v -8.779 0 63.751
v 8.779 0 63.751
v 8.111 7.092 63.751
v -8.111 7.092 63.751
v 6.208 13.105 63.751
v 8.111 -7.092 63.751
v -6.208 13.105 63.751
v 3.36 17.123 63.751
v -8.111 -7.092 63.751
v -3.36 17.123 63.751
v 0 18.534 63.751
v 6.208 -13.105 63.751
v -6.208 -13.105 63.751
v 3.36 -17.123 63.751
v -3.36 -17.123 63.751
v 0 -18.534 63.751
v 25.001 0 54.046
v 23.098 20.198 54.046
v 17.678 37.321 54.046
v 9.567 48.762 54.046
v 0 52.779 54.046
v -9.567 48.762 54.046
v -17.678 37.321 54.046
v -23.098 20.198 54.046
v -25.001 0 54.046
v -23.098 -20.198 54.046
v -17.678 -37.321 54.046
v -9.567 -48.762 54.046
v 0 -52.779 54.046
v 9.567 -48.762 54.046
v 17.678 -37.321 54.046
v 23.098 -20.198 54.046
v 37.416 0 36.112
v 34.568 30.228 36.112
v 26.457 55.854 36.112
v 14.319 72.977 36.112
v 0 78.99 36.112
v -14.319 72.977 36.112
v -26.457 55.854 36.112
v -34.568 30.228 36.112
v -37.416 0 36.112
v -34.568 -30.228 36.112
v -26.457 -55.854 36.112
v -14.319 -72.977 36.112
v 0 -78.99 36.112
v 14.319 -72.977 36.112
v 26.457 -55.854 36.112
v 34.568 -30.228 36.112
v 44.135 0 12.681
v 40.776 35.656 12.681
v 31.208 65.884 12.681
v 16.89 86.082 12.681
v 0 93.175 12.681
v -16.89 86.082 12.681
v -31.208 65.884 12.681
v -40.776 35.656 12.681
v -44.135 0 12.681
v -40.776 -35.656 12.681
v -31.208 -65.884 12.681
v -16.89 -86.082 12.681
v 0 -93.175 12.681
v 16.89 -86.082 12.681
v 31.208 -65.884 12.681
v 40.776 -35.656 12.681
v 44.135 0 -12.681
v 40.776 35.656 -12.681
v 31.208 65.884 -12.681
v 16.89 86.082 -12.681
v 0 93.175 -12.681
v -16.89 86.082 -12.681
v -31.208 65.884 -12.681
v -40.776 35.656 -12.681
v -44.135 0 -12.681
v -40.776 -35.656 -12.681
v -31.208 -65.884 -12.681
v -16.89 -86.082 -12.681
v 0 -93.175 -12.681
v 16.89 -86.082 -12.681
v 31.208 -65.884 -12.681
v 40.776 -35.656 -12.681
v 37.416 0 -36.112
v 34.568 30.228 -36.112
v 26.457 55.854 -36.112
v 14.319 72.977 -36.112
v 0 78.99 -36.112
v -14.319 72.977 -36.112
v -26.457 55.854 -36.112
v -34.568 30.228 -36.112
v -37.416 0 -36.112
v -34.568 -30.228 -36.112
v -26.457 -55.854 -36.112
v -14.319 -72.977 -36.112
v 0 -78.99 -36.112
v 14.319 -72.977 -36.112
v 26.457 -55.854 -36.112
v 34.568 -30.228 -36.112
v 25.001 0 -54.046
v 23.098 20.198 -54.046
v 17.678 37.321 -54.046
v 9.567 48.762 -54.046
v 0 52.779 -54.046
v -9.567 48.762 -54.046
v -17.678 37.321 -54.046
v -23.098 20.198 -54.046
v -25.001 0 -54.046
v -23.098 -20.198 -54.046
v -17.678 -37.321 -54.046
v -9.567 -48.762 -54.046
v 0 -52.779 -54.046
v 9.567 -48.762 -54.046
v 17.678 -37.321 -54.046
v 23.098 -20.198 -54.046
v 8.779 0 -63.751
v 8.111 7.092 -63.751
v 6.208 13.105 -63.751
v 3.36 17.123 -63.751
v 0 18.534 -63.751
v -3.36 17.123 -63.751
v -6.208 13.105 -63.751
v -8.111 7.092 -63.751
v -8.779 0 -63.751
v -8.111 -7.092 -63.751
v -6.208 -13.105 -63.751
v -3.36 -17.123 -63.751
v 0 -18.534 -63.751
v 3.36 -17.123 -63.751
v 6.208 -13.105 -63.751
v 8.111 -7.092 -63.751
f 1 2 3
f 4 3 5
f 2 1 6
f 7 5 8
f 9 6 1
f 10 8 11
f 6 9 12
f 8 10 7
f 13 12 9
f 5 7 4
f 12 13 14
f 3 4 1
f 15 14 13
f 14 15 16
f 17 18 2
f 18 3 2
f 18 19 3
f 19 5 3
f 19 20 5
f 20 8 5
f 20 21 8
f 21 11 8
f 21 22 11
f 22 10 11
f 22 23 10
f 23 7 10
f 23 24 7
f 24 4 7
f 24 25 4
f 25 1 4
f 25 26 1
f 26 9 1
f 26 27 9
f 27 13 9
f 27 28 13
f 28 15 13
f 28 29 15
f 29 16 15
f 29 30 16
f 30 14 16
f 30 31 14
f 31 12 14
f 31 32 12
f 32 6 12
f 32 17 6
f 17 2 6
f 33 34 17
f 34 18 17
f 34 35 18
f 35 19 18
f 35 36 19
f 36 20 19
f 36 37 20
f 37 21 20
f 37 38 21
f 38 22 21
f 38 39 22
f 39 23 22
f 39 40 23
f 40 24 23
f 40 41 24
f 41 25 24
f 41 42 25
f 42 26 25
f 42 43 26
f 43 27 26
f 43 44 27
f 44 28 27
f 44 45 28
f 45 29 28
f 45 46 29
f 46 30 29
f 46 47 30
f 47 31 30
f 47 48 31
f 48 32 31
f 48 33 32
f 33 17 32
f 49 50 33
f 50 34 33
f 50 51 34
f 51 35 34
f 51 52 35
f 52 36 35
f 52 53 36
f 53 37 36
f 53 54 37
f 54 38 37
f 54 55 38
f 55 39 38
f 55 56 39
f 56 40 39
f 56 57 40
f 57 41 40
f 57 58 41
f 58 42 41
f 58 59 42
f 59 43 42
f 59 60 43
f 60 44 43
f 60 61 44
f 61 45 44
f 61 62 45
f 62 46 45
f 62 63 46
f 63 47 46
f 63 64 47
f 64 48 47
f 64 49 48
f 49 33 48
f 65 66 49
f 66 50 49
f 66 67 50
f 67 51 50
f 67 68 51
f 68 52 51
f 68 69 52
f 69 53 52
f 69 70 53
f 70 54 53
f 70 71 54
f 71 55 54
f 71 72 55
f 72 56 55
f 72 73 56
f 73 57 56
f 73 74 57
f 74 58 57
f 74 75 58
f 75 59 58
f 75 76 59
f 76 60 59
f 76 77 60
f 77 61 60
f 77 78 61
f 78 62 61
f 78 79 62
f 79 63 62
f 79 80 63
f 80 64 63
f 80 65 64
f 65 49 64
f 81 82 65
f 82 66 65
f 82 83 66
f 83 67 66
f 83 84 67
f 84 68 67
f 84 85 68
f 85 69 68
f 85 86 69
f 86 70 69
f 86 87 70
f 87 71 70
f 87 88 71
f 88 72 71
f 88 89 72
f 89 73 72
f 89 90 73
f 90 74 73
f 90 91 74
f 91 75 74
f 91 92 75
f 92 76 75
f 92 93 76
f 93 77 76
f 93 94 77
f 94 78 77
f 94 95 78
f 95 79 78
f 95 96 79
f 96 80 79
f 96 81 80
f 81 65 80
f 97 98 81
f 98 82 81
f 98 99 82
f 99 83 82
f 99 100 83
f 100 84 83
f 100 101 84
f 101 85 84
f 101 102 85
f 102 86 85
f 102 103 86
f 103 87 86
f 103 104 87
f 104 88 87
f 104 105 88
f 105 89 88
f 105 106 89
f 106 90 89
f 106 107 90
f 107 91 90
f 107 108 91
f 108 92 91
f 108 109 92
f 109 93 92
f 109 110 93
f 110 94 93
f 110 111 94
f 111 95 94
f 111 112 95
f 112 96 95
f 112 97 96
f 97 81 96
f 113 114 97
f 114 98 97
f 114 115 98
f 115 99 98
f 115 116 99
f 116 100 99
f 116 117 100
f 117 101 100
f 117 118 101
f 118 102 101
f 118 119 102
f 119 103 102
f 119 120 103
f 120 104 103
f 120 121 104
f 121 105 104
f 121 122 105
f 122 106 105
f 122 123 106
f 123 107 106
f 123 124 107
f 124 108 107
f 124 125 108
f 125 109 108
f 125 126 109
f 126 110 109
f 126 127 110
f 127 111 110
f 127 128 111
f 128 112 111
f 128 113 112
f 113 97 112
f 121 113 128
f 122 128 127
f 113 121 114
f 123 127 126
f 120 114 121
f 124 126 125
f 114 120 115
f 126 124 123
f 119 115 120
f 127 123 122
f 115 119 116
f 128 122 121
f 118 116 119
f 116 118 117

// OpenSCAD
// Generated by SolidPython 1.0.1 on 2020-07-29 00:46:49


scale(v = [9, 19, 13]) {
	sphere(r = 5);
}
/***********************************************
*********      SolidPython code:      **********
************************************************
 
# import packages: SolidPython
from solid import *
from solid.utils import *
from itertools import chain, combinations, permutations


class Resize:

    def __init__(self, scad_file):
        self.scad_file = scad_file
        #self.scad_file = import_scad(scad_file)
        # cone/cylinder param:
        self.r1 = 0
        self.r2 = 0
        self.h = 0
        # rectangular prism param:
        self.w = 0
        self.l = 0
        # ellipse param:
        self.r = 0

    # import OpenScad code (file name corresponds to shape)


    # classify shape + parameters
    def assign(self, param1, param2, param3):
        if self.scad_file == 'cone.scad':
            self.r1 = param1
            self.r2 = param2
            self.h = param3
        elif self.scad_file == 'cylinder.scad':
            self.r1 = param1
            self.r2 = param2
            self.h = param3
        elif self.scad_file == 'rectangularPrism.scad':
            self.h = param1
            self.l = param2
            self.w = param3
        else:
            self.r = param1
            self.h = param2

    # resize parameters
    def iterate(self):
        x = range(3, 20, 2)
        i = 1
        if self.scad_file == 'cone.scad':
            tempList = list(permutations(x, 2))
            for temp in tempList:
                param1 = temp[0]
                param2 = temp[1]
                filepath = 'produced_scad_files/' + 'cone' + str(param1) + '_' + str(param2) + '_' + '.scad'
                scad_render_to_file(cylinder(h=param1, r1=param2, r2=0), filepath)

        elif self.scad_file == 'cylinder.scad':
            tempList = list(permutations(x, 3))
            for temp in tempList:
                param1 = temp[0]
                param2 = temp[1]
                filepath = 'produced_scad_files/' + 'cylinder' + str(param1) + '_' + str(param2) + '_' + '.scad'
                scad_render_to_file(cylinder(h=param1, r1=param2, r2=param2), filepath)

        elif self.scad_file == 'rectangularPrism.scad':
            tempList = list(permutations(x, 3))
            for temp in tempList:
                param1 = temp[0]
                param2 = temp[1]
                param3 = temp[2]
                filepath = 'produced_scad_files/' + 'rectangularPrism' + str(param1) + '_' + str(param2) + '_' + str(
                    param3) + '.scad'
                scad_render_to_file(cube(size=(param1, param2, param3)), filepath)

        elif self.scad_file == 'ellipse.scad':
            tempList = list(permutations(x, 4))
            for temp in tempList:
                param1 = temp[0]
                param2 = temp[1]
                param3 = temp[2]
                param4 = temp[3]
                filepath = 'produced_scad_files/' + 'ellipse' + str(param1) + '_' + str(param2) + '_' + str(param3) + '_' + str(param4) + '.scad'
                scad_render_to_file(scale([param1, param2, param3])(sphere(r=param4)), filepath)

    def render_to_scadfile(self):
        scad_render_to_file(scad, 'example.scad') 
 
************************************************/
